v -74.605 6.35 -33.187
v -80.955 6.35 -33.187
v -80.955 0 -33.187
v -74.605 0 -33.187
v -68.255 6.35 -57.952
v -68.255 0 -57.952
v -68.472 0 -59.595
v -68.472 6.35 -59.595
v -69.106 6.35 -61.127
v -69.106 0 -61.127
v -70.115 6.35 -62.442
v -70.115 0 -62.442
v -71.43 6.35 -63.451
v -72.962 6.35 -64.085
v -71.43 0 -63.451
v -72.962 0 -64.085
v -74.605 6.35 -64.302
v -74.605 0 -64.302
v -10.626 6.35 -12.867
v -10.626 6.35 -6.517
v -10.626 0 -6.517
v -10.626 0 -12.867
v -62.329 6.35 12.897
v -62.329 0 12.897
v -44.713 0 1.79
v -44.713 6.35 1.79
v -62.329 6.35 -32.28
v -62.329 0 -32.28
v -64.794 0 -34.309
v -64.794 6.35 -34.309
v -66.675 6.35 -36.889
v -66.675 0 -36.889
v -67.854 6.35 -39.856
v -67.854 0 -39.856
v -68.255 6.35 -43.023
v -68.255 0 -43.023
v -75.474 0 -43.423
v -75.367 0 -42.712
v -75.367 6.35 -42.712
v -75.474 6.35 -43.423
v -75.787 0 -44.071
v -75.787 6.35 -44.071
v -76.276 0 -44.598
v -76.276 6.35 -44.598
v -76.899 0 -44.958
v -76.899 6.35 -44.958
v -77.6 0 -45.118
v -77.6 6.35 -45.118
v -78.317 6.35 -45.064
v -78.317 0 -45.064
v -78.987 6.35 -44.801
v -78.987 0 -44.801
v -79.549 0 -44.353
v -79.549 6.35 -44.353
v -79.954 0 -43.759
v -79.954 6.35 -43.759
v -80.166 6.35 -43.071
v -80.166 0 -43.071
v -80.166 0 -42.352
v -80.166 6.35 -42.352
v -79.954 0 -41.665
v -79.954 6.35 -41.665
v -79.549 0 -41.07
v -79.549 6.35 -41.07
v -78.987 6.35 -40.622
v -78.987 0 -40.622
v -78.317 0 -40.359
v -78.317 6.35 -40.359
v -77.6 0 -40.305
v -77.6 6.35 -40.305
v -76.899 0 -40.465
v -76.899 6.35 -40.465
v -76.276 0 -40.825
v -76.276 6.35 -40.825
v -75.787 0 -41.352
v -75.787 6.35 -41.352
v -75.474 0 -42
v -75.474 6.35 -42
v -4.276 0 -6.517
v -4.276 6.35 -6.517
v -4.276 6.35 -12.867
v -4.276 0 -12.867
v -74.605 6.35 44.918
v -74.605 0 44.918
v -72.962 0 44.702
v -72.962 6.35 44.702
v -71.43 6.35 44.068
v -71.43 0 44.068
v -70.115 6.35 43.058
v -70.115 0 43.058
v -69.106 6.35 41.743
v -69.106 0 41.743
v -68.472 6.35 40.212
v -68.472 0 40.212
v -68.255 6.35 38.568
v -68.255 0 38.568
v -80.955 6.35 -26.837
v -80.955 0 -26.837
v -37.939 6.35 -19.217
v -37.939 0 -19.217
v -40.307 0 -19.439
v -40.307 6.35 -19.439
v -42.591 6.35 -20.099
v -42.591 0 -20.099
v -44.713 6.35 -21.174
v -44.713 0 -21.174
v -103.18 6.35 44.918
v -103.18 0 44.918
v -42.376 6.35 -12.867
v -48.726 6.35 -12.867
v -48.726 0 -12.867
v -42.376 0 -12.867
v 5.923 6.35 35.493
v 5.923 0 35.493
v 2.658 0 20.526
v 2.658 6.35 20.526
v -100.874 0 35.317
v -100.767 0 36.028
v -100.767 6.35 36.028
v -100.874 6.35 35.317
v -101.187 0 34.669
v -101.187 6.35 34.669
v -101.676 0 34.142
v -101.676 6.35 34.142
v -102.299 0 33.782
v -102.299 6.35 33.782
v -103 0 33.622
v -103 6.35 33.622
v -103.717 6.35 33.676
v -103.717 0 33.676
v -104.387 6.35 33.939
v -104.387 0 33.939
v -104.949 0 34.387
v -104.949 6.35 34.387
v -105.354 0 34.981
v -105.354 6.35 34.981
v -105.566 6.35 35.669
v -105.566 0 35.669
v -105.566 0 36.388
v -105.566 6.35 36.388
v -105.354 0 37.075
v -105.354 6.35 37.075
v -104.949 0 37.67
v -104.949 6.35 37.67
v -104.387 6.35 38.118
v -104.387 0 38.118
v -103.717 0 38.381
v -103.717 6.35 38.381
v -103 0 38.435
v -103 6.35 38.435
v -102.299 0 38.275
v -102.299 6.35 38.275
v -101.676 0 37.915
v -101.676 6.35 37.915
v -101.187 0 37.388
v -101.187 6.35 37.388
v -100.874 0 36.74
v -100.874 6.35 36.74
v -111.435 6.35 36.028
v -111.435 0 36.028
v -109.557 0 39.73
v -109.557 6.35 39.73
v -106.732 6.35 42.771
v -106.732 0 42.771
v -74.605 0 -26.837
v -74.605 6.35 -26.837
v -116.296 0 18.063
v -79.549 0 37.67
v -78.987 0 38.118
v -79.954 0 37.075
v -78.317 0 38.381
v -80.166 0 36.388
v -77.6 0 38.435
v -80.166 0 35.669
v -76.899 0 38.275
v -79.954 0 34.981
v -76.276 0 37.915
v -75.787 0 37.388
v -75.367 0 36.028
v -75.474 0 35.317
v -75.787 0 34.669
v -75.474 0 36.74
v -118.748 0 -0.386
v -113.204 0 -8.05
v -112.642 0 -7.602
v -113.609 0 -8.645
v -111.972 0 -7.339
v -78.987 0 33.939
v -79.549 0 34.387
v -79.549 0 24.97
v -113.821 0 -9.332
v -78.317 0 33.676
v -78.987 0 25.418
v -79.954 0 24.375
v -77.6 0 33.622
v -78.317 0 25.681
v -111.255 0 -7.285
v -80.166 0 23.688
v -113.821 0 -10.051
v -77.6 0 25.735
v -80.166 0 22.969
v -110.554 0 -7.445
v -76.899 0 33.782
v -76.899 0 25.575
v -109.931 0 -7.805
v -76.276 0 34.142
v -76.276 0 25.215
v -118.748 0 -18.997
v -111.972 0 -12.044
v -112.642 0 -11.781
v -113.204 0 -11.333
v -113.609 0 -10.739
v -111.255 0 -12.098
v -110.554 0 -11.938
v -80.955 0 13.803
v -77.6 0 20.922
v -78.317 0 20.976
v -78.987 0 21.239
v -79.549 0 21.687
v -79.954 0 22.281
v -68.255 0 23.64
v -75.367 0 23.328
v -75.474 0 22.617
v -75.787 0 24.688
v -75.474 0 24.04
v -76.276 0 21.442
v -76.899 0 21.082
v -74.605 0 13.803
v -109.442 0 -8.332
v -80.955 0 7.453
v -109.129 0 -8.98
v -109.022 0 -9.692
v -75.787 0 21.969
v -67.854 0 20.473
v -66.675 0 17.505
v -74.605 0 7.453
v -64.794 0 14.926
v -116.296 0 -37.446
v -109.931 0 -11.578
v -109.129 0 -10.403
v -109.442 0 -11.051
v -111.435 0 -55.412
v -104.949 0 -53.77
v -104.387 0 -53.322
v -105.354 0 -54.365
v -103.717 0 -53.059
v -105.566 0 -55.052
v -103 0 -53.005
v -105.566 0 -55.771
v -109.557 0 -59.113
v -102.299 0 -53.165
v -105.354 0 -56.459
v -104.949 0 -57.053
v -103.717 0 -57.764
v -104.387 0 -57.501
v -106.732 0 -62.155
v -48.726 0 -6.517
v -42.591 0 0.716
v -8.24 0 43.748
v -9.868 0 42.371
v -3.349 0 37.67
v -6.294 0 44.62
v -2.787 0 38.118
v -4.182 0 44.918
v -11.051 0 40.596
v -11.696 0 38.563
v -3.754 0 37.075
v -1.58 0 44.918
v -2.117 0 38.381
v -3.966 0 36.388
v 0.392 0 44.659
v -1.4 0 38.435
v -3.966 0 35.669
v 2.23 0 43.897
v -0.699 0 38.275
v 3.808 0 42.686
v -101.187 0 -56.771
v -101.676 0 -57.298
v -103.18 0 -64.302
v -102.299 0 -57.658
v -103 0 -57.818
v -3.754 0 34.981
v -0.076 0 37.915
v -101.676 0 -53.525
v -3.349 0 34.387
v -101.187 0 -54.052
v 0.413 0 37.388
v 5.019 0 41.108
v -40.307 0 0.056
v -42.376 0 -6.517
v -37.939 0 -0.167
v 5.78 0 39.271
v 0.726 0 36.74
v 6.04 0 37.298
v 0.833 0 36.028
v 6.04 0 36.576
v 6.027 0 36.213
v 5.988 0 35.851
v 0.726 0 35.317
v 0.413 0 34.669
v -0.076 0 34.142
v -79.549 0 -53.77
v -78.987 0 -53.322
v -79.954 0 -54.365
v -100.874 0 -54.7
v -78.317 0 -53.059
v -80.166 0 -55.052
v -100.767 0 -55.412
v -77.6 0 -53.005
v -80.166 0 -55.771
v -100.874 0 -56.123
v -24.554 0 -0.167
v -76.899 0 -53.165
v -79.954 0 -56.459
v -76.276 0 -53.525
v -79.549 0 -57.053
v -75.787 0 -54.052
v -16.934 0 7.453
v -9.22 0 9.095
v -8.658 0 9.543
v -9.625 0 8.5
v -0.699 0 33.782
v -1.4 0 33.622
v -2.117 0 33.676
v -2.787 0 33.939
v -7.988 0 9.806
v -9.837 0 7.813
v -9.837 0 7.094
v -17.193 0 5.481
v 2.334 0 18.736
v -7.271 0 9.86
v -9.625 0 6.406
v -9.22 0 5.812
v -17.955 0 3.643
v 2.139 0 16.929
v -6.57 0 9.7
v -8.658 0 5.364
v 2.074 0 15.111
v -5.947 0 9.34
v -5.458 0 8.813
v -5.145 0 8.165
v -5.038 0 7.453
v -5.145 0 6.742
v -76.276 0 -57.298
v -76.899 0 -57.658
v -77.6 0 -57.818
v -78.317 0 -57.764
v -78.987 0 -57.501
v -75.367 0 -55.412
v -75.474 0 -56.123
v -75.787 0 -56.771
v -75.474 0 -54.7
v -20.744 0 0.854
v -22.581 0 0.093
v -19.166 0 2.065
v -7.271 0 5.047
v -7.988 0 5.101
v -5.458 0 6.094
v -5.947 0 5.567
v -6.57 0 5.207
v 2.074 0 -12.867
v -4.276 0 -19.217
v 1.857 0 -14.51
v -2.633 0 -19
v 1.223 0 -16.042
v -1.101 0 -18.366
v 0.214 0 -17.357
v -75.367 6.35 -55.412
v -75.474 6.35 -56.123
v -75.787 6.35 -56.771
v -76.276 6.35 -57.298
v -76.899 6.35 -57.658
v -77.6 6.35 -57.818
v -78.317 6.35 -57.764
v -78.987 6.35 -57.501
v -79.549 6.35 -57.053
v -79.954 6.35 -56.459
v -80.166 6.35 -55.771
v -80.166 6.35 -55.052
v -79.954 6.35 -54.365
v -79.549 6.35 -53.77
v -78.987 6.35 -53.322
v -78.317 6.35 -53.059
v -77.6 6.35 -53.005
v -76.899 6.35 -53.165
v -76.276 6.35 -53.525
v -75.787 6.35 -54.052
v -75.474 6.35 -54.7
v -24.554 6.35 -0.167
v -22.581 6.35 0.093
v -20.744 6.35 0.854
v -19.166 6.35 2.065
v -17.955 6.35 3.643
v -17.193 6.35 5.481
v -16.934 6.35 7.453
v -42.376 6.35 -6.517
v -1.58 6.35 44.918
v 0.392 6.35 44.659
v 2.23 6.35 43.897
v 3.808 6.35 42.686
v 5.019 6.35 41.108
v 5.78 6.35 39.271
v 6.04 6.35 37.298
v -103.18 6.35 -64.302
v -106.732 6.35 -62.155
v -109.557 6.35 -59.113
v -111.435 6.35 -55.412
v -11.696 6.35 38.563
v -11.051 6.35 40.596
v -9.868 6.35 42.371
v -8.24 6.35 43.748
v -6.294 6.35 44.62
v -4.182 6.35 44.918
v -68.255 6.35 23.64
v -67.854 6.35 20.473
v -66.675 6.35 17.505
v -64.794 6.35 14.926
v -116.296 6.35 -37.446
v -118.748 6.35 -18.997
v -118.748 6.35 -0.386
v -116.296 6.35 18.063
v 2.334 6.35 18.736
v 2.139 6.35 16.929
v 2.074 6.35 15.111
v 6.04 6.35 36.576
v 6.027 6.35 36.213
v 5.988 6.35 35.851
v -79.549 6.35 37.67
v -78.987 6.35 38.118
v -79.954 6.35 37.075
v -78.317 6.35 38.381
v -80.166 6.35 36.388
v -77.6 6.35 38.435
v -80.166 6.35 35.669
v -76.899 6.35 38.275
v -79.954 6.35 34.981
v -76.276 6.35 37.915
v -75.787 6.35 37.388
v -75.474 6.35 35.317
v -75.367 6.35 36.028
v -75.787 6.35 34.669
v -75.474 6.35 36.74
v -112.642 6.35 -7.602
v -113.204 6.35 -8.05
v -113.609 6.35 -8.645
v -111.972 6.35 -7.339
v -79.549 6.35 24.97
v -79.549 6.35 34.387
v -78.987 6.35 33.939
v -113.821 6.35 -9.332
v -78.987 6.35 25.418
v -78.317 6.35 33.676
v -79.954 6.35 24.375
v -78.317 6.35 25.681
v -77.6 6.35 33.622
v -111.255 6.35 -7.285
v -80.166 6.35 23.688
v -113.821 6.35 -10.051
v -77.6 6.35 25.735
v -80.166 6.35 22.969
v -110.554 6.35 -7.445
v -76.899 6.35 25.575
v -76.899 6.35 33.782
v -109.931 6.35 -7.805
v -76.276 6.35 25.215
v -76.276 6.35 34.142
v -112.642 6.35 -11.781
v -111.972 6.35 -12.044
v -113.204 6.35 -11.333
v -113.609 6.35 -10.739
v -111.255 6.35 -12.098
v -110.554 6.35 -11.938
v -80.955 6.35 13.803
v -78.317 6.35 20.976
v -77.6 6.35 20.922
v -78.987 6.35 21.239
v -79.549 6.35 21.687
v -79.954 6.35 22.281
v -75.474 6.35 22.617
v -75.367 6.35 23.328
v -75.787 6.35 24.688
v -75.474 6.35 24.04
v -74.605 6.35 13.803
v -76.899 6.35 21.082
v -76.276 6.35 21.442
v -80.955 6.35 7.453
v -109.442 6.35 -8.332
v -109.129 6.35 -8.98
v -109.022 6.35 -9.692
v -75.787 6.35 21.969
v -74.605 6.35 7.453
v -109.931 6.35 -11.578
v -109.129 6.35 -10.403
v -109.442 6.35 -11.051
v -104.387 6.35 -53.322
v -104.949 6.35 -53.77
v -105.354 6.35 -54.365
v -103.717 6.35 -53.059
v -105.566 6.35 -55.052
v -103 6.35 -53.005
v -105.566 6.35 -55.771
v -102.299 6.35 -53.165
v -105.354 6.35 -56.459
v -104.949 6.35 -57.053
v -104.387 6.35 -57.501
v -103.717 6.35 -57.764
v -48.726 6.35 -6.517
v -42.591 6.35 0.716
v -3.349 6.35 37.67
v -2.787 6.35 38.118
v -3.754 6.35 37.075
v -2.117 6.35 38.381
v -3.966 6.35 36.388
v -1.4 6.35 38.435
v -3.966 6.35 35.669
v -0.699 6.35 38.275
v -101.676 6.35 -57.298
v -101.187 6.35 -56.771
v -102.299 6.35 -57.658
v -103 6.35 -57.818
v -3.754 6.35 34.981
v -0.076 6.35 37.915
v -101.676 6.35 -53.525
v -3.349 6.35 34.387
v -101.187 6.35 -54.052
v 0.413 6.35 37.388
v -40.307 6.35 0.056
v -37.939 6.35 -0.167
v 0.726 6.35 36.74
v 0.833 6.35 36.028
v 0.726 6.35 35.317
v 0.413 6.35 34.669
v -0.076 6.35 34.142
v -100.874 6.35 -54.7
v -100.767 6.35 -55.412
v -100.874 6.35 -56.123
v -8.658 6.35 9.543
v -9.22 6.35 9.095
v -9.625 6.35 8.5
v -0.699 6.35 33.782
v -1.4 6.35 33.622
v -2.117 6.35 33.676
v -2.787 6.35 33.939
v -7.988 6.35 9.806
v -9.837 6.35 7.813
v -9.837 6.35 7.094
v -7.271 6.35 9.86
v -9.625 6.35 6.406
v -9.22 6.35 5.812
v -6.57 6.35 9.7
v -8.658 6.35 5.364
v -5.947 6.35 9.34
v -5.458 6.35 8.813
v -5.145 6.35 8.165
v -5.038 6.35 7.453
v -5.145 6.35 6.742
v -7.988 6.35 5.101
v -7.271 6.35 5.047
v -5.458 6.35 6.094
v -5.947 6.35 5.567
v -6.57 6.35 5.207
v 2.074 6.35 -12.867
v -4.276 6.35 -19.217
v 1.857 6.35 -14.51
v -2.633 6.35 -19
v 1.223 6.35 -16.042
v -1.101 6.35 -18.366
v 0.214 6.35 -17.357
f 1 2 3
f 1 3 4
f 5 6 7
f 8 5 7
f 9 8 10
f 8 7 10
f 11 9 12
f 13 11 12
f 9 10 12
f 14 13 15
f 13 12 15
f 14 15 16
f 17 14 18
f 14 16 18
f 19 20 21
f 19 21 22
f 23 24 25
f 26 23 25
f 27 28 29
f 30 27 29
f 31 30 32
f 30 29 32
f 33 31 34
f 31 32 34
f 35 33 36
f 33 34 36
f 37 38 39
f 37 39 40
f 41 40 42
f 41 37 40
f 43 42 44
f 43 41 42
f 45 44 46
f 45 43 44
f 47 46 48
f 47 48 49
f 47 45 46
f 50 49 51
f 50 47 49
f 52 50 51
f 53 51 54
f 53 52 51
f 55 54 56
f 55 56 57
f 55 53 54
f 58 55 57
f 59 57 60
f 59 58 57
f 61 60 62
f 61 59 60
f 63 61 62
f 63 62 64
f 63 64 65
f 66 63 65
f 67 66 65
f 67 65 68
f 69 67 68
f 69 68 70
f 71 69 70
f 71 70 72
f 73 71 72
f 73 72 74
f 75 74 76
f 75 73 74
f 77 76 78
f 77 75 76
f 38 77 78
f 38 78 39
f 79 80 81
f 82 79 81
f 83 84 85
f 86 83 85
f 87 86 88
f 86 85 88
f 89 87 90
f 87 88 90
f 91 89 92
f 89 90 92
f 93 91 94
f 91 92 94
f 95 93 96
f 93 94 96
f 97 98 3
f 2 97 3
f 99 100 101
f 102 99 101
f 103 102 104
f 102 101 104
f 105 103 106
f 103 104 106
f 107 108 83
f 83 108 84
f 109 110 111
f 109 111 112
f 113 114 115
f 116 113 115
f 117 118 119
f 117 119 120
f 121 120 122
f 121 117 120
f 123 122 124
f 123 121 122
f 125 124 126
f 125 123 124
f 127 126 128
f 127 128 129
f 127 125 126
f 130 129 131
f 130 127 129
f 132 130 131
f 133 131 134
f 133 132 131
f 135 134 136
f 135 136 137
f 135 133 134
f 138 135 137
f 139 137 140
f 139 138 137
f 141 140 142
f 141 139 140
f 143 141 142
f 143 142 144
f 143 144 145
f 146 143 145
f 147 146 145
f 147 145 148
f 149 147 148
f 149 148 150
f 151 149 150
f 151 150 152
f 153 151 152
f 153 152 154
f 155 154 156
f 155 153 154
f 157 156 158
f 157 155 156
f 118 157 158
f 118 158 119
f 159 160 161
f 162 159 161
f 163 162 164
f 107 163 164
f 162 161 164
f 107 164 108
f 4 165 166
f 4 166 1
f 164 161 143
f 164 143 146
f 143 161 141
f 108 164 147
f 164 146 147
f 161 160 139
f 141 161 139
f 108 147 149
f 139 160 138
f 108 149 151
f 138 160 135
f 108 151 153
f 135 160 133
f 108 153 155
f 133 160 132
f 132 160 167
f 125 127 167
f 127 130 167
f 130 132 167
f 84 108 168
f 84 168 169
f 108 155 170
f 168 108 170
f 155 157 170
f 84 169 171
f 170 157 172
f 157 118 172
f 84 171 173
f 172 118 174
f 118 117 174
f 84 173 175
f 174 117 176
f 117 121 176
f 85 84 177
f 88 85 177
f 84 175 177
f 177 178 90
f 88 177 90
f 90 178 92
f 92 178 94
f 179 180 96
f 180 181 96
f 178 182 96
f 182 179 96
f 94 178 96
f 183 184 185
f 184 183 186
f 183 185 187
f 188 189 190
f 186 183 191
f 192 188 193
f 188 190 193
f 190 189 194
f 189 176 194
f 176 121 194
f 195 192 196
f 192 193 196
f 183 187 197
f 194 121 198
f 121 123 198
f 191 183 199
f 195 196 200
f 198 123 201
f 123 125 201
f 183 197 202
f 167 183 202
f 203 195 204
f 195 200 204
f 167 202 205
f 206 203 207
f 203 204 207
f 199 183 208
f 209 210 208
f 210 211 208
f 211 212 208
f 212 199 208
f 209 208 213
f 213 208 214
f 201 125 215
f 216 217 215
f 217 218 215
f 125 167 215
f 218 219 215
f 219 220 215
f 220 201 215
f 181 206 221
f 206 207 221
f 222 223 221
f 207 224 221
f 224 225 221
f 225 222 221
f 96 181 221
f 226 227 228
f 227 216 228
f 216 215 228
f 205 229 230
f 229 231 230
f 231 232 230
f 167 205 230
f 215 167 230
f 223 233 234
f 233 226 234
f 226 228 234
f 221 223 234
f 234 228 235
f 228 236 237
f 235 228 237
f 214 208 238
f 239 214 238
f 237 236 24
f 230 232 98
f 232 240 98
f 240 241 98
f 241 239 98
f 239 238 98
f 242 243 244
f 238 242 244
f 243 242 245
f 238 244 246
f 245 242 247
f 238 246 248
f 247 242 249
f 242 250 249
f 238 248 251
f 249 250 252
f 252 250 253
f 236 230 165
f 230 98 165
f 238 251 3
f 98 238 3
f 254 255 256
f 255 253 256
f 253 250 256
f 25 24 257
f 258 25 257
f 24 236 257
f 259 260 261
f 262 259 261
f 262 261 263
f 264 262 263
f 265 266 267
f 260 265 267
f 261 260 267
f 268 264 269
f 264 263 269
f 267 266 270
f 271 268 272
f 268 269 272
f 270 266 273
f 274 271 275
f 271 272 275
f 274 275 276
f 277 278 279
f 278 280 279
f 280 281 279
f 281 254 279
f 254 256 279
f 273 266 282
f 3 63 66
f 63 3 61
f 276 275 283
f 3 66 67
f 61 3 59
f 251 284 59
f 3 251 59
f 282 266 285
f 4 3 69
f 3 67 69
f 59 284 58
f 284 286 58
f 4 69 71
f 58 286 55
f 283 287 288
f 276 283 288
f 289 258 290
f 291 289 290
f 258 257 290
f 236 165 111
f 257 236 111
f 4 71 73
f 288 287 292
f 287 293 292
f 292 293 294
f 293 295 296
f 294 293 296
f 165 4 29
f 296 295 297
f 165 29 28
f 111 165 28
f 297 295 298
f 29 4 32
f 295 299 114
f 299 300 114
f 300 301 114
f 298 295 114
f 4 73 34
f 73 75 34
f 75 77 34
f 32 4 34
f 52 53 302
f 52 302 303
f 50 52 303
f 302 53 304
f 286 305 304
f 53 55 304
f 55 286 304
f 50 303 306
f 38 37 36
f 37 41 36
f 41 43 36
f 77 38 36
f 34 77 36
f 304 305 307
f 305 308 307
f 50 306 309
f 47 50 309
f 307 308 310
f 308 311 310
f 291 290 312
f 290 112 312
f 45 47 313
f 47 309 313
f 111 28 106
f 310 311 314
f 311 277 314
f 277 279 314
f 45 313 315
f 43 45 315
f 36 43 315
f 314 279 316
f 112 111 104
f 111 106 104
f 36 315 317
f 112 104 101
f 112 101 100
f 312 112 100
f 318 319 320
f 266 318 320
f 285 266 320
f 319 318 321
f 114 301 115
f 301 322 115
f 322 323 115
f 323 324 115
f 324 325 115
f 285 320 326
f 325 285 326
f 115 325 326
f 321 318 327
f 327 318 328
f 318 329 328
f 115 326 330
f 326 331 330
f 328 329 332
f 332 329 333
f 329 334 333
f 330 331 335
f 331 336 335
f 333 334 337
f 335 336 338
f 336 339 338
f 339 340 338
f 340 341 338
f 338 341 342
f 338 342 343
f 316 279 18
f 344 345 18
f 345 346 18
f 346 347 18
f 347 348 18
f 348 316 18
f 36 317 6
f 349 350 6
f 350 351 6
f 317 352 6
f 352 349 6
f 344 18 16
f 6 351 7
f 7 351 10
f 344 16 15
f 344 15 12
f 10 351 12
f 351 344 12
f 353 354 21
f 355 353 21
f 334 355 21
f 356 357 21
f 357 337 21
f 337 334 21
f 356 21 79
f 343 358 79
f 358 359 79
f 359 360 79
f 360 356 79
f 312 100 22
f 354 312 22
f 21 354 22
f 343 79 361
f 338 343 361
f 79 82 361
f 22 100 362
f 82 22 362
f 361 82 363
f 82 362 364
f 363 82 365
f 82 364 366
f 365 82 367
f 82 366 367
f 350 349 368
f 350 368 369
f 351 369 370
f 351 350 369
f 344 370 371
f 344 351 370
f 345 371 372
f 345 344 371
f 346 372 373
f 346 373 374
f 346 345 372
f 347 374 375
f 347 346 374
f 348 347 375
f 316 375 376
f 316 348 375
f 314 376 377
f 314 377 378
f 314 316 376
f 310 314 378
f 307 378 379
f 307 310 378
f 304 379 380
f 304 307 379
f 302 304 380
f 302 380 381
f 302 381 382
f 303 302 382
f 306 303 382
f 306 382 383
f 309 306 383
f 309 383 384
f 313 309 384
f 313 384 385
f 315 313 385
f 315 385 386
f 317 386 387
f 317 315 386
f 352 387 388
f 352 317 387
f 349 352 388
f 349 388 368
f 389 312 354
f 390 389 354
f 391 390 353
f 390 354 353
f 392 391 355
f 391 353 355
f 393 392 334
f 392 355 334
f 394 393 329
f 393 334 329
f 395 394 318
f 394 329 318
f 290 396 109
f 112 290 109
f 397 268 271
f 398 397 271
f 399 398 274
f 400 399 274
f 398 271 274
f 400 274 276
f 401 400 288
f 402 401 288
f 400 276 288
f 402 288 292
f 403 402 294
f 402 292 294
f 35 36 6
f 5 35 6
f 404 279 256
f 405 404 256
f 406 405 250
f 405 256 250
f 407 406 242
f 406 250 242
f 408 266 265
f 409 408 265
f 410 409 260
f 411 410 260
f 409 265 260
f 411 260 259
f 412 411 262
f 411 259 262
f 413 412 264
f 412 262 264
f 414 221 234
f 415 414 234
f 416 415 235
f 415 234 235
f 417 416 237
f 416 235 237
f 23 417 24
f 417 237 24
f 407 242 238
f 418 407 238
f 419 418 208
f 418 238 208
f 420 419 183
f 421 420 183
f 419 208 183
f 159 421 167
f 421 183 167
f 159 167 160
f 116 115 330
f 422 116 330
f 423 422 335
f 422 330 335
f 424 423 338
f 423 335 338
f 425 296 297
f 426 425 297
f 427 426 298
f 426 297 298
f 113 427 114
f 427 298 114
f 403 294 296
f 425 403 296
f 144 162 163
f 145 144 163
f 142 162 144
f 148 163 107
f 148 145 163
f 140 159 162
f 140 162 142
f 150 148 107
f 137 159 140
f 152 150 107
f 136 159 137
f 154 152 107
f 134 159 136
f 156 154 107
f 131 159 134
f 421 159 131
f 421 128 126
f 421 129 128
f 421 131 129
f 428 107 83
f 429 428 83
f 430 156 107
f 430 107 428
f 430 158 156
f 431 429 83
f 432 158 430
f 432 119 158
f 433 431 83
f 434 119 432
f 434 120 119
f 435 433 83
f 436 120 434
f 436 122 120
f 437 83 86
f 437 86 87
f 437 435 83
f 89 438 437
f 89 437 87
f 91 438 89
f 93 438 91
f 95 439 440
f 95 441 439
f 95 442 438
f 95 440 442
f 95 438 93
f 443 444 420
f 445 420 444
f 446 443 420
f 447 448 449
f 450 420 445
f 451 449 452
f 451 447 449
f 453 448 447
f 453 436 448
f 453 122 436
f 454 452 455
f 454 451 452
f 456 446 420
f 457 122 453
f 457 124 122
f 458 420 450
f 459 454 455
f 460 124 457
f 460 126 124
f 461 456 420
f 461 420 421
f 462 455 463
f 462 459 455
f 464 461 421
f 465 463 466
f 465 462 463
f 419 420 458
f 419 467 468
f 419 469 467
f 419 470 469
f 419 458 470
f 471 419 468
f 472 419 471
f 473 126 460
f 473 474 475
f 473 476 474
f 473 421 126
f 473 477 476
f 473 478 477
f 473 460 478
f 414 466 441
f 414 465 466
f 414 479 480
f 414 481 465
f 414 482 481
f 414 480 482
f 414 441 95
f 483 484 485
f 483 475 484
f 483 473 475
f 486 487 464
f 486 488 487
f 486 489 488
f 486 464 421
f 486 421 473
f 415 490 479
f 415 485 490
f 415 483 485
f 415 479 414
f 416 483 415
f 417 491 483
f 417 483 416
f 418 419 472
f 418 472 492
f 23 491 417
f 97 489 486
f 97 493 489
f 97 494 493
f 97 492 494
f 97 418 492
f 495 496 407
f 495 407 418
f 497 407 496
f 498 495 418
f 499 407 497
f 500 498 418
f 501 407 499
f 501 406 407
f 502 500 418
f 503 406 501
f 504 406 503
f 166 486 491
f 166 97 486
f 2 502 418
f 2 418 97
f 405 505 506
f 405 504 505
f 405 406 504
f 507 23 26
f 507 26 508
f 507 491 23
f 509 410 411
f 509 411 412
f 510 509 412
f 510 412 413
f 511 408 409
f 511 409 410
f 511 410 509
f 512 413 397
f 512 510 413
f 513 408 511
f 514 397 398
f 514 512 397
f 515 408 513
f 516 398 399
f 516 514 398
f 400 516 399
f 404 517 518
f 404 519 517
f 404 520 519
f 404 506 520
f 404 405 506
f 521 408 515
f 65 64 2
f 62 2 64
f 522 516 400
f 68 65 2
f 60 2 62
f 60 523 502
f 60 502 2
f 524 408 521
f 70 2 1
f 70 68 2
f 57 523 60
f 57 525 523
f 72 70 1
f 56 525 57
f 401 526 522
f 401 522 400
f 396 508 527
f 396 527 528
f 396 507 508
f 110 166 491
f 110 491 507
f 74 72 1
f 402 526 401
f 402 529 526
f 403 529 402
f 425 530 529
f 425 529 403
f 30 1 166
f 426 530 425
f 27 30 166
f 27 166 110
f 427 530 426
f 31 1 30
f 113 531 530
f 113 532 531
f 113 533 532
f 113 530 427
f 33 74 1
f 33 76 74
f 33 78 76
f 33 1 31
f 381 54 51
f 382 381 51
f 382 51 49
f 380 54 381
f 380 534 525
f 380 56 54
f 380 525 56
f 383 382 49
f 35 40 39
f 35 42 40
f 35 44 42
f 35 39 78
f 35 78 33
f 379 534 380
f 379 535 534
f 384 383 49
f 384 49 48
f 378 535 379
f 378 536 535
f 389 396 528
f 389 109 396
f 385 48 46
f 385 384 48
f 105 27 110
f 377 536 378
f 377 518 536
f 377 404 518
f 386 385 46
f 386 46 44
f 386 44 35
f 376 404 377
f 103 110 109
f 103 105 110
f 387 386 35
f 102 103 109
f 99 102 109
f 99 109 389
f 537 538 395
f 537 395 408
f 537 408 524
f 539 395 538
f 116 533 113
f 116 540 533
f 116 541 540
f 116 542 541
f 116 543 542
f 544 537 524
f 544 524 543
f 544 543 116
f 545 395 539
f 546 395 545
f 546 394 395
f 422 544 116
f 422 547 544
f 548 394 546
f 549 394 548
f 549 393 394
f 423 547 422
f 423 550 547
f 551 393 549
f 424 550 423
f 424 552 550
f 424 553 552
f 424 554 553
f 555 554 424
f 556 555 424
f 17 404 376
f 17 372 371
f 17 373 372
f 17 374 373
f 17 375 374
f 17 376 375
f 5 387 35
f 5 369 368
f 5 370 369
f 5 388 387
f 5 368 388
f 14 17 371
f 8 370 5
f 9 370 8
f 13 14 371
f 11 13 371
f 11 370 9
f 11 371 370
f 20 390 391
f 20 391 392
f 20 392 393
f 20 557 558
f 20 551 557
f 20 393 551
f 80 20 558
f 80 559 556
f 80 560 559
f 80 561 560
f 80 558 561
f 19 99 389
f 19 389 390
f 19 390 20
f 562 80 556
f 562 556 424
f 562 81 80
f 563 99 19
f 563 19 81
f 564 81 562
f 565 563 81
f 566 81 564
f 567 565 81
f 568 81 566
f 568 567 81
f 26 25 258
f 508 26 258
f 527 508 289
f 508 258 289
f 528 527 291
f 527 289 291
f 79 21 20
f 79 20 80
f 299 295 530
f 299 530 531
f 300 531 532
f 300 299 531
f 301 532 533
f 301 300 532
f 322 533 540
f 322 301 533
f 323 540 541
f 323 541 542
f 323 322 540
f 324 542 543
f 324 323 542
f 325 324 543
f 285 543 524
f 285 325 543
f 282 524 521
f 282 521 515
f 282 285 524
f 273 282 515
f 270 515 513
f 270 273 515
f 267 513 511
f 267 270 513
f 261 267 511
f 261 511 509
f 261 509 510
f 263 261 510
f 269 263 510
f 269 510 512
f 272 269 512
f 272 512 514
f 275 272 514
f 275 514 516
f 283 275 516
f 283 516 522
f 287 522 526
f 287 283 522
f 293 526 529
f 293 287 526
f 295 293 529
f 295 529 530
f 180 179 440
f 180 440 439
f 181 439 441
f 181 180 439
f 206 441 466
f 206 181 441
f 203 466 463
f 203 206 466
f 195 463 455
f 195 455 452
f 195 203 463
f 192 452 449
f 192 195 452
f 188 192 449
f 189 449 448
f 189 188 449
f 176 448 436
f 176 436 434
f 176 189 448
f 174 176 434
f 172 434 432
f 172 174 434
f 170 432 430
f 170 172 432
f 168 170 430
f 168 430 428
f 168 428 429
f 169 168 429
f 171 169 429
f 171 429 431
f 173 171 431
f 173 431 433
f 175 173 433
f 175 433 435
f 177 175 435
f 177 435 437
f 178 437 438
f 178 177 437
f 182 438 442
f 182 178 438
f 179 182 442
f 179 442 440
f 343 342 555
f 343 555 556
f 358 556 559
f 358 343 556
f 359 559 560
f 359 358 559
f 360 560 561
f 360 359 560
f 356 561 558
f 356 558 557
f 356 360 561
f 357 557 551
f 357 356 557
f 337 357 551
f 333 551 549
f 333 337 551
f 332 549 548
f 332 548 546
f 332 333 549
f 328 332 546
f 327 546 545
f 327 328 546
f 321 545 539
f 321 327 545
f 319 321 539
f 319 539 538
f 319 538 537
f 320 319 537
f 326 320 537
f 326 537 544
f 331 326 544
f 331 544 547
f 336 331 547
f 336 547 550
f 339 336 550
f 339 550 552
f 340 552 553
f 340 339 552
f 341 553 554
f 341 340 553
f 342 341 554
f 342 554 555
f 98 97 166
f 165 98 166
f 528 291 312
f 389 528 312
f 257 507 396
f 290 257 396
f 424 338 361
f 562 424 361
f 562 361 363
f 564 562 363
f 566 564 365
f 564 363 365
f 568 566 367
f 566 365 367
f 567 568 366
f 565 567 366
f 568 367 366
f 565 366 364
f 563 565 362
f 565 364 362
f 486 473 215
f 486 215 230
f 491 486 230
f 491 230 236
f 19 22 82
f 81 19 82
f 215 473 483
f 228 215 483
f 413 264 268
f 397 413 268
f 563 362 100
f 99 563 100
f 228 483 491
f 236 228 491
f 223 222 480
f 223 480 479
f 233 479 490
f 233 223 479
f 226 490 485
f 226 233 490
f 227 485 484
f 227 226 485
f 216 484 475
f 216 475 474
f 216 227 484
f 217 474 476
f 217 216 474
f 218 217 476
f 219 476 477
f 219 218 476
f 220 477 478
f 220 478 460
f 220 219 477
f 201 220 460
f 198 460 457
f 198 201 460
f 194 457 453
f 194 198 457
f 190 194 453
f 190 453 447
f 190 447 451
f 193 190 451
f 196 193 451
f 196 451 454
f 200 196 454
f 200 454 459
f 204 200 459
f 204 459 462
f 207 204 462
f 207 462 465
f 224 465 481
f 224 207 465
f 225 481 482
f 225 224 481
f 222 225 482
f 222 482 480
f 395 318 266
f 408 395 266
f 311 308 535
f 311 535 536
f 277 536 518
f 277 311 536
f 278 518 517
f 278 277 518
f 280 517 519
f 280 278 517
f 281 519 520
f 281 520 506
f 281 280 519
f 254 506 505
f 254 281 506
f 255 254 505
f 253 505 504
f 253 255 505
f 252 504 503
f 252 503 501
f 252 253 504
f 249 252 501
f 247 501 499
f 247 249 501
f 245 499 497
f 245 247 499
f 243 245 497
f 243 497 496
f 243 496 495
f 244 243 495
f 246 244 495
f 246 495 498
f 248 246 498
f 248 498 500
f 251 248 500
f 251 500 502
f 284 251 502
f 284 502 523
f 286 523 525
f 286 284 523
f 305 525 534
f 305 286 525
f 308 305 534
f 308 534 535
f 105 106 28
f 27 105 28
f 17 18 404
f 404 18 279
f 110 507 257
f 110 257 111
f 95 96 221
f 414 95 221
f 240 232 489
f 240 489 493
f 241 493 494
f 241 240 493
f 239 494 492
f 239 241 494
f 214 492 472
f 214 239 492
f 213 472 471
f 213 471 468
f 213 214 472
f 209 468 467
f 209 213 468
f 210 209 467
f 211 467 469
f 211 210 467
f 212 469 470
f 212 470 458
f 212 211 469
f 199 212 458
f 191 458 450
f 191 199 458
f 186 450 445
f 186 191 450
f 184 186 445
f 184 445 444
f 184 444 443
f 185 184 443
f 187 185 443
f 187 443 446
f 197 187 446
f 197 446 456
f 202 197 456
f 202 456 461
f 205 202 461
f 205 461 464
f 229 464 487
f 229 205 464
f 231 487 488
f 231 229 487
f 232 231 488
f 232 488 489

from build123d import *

# Parameters (mm, degrees)
SKETCH1_R           = 2.413
SKETCH1_W           = 6.35
SKETCH1_H           = 6.35
BOSS_EXTRUDE1_DEPTH = 6.35


with BuildPart() as part:
    # Sketch1 → Boss-Extrude1 (new body)
    with BuildSketch(Plane(origin=(0, 0, 0), x_dir=(1, 0, 0), z_dir=(0, 1, 0))):
        with BuildLine():
            Line((-4.276232573, 19.216684391), (-37.939187052, 19.216684391))
            ThreePointArc((-37.939187052, 19.216684391), (-41.464378908, 19.715740887), (-44.712520386, 21.17368874))
            Line((-44.712520386, 21.17368874), (-62.328552859, 32.280391547))
            ThreePointArc((-62.328552859, 32.280391547), (-66.67527648, 36.888704376), (-68.255219526, 43.023387198))
            Line((-68.255219526, 43.023387198), (-68.255219526, 57.951684391))
            ThreePointArc((-68.255219526, 57.951684391), (-70.115091465, 62.441812452), (-74.605219526, 64.301684391))
            Line((-74.605219526, 64.301684391), (-103.180219526, 64.301684391))
            ThreePointArc((-103.180219526, 64.301684391), (-108.250679153, 60.73228976), (-111.435219526, 55.411684391))
            ThreePointArc((-111.435219526, 55.411684391), (-119.055219526, 9.691684391), (-111.435219526, -36.028315609))
            ThreePointArc((-111.435219526, -36.028315609), (-108.250679153, -41.348920977), (-103.180219526, -44.918315609))
            Line((-103.180219526, -44.918315609), (-74.605219526, -44.918315609))
            ThreePointArc((-74.605219526, -44.918315609), (-70.115091465, -43.058443669), (-68.255219526, -38.568315609))
            Line((-68.255219526, -38.568315609), (-68.255219526, -23.640018416))
            ThreePointArc((-68.255219526, -23.640018416), (-66.67527648, -17.505335593), (-62.328552859, -12.897022765))
            Line((-62.328552859, -12.897022765), (-44.712520386, -1.790319958))
            ThreePointArc((-44.712520386, -1.790319958), (-41.464378908, -0.332372105), (-37.939187052, 0.166684391))
            Line((-37.939187052, 0.166684391), (-27.387614836, 0.166684391))
            Line((-27.387614836, 0.166684391), (-24.553673229, 0.166684391))
            ThreePointArc((-24.553673229, 0.166684391), (-19.165519557, -2.065161936), (-16.933673229, -7.453315609))
            Line((-16.933673229, -7.453315609), (-11.696120928, -38.563381903))
            ThreePointArc((-11.696120928, -38.563381903), (-9.102466616, -43.116571583), (-4.181867321, -44.918315609))
            Line((-4.181867321, -44.918315609), (-1.580219526, -44.918315609))
            ThreePointArc((-1.580219526, -44.918315609), (3.807934147, -42.686469281), (6.039780474, -37.298315609))
            Line((6.039780474, -37.298315609), (6.039780474, -36.576031258))
            ThreePointArc((6.039780474, -36.576031258), (6.010508622, -36.031471642), (5.923030406, -35.493187723))
            Line((5.923030406, -35.493187723), (2.657517771, -20.525600214))
            ThreePointArc((2.657517771, -20.525600214), (2.220126687, -17.834180618), (2.073767427, -15.111382542))
            Line((2.073767427, -15.111382542), (2.073767427, 5.246684391))
            Line((2.073767427, 5.246684391), (2.073767427, 12.866684391))
            ThreePointArc((2.073767427, 12.866684391), (0.213895488, 17.356812452), (-4.276232573, 19.216684391))
        make_face()
        with Locations((-103.180219526, -36.028315609)):
            Circle(SKETCH1_R, mode=Mode.SUBTRACT)
        with Locations((-77.780219526, -36.028315609)):
            Circle(SKETCH1_R, mode=Mode.SUBTRACT)
        with Locations((-77.780219526, -23.328315609)):
            Circle(SKETCH1_R, mode=Mode.SUBTRACT)
        with Locations((-77.780219526, -10.628315609)):
            Rectangle(SKETCH1_W, SKETCH1_H, mode=Mode.SUBTRACT)
        with Locations((-1.580219526, -36.028315609)):
            Circle(SKETCH1_R, mode=Mode.SUBTRACT)
        with Locations((-7.451232573, -7.453315609)):
            Circle(SKETCH1_R, mode=Mode.SUBTRACT)
        with Locations((-111.435219526, 9.691684391)):
            Circle(SKETCH1_R, mode=Mode.SUBTRACT)
        with Locations((-77.780219526, 30.011684391)):
            Rectangle(SKETCH1_W, SKETCH1_H, mode=Mode.SUBTRACT)
        with Locations((-103.180219526, 55.411684391)):
            Circle(SKETCH1_R, mode=Mode.SUBTRACT)
        with Locations((-77.780219526, 42.711684391)):
            Circle(SKETCH1_R, mode=Mode.SUBTRACT)
        with Locations((-77.780219526, 55.411684391)):
            Circle(SKETCH1_R, mode=Mode.SUBTRACT)
        with Locations((-45.551232573, 9.691684391)):
            Rectangle(SKETCH1_W, SKETCH1_H, mode=Mode.SUBTRACT)
        with Locations((-7.451232573, 9.691684391)):
            Rectangle(SKETCH1_W, SKETCH1_H, mode=Mode.SUBTRACT)
    extrude(amount=BOSS_EXTRUDE1_DEPTH)


solid = part.part
